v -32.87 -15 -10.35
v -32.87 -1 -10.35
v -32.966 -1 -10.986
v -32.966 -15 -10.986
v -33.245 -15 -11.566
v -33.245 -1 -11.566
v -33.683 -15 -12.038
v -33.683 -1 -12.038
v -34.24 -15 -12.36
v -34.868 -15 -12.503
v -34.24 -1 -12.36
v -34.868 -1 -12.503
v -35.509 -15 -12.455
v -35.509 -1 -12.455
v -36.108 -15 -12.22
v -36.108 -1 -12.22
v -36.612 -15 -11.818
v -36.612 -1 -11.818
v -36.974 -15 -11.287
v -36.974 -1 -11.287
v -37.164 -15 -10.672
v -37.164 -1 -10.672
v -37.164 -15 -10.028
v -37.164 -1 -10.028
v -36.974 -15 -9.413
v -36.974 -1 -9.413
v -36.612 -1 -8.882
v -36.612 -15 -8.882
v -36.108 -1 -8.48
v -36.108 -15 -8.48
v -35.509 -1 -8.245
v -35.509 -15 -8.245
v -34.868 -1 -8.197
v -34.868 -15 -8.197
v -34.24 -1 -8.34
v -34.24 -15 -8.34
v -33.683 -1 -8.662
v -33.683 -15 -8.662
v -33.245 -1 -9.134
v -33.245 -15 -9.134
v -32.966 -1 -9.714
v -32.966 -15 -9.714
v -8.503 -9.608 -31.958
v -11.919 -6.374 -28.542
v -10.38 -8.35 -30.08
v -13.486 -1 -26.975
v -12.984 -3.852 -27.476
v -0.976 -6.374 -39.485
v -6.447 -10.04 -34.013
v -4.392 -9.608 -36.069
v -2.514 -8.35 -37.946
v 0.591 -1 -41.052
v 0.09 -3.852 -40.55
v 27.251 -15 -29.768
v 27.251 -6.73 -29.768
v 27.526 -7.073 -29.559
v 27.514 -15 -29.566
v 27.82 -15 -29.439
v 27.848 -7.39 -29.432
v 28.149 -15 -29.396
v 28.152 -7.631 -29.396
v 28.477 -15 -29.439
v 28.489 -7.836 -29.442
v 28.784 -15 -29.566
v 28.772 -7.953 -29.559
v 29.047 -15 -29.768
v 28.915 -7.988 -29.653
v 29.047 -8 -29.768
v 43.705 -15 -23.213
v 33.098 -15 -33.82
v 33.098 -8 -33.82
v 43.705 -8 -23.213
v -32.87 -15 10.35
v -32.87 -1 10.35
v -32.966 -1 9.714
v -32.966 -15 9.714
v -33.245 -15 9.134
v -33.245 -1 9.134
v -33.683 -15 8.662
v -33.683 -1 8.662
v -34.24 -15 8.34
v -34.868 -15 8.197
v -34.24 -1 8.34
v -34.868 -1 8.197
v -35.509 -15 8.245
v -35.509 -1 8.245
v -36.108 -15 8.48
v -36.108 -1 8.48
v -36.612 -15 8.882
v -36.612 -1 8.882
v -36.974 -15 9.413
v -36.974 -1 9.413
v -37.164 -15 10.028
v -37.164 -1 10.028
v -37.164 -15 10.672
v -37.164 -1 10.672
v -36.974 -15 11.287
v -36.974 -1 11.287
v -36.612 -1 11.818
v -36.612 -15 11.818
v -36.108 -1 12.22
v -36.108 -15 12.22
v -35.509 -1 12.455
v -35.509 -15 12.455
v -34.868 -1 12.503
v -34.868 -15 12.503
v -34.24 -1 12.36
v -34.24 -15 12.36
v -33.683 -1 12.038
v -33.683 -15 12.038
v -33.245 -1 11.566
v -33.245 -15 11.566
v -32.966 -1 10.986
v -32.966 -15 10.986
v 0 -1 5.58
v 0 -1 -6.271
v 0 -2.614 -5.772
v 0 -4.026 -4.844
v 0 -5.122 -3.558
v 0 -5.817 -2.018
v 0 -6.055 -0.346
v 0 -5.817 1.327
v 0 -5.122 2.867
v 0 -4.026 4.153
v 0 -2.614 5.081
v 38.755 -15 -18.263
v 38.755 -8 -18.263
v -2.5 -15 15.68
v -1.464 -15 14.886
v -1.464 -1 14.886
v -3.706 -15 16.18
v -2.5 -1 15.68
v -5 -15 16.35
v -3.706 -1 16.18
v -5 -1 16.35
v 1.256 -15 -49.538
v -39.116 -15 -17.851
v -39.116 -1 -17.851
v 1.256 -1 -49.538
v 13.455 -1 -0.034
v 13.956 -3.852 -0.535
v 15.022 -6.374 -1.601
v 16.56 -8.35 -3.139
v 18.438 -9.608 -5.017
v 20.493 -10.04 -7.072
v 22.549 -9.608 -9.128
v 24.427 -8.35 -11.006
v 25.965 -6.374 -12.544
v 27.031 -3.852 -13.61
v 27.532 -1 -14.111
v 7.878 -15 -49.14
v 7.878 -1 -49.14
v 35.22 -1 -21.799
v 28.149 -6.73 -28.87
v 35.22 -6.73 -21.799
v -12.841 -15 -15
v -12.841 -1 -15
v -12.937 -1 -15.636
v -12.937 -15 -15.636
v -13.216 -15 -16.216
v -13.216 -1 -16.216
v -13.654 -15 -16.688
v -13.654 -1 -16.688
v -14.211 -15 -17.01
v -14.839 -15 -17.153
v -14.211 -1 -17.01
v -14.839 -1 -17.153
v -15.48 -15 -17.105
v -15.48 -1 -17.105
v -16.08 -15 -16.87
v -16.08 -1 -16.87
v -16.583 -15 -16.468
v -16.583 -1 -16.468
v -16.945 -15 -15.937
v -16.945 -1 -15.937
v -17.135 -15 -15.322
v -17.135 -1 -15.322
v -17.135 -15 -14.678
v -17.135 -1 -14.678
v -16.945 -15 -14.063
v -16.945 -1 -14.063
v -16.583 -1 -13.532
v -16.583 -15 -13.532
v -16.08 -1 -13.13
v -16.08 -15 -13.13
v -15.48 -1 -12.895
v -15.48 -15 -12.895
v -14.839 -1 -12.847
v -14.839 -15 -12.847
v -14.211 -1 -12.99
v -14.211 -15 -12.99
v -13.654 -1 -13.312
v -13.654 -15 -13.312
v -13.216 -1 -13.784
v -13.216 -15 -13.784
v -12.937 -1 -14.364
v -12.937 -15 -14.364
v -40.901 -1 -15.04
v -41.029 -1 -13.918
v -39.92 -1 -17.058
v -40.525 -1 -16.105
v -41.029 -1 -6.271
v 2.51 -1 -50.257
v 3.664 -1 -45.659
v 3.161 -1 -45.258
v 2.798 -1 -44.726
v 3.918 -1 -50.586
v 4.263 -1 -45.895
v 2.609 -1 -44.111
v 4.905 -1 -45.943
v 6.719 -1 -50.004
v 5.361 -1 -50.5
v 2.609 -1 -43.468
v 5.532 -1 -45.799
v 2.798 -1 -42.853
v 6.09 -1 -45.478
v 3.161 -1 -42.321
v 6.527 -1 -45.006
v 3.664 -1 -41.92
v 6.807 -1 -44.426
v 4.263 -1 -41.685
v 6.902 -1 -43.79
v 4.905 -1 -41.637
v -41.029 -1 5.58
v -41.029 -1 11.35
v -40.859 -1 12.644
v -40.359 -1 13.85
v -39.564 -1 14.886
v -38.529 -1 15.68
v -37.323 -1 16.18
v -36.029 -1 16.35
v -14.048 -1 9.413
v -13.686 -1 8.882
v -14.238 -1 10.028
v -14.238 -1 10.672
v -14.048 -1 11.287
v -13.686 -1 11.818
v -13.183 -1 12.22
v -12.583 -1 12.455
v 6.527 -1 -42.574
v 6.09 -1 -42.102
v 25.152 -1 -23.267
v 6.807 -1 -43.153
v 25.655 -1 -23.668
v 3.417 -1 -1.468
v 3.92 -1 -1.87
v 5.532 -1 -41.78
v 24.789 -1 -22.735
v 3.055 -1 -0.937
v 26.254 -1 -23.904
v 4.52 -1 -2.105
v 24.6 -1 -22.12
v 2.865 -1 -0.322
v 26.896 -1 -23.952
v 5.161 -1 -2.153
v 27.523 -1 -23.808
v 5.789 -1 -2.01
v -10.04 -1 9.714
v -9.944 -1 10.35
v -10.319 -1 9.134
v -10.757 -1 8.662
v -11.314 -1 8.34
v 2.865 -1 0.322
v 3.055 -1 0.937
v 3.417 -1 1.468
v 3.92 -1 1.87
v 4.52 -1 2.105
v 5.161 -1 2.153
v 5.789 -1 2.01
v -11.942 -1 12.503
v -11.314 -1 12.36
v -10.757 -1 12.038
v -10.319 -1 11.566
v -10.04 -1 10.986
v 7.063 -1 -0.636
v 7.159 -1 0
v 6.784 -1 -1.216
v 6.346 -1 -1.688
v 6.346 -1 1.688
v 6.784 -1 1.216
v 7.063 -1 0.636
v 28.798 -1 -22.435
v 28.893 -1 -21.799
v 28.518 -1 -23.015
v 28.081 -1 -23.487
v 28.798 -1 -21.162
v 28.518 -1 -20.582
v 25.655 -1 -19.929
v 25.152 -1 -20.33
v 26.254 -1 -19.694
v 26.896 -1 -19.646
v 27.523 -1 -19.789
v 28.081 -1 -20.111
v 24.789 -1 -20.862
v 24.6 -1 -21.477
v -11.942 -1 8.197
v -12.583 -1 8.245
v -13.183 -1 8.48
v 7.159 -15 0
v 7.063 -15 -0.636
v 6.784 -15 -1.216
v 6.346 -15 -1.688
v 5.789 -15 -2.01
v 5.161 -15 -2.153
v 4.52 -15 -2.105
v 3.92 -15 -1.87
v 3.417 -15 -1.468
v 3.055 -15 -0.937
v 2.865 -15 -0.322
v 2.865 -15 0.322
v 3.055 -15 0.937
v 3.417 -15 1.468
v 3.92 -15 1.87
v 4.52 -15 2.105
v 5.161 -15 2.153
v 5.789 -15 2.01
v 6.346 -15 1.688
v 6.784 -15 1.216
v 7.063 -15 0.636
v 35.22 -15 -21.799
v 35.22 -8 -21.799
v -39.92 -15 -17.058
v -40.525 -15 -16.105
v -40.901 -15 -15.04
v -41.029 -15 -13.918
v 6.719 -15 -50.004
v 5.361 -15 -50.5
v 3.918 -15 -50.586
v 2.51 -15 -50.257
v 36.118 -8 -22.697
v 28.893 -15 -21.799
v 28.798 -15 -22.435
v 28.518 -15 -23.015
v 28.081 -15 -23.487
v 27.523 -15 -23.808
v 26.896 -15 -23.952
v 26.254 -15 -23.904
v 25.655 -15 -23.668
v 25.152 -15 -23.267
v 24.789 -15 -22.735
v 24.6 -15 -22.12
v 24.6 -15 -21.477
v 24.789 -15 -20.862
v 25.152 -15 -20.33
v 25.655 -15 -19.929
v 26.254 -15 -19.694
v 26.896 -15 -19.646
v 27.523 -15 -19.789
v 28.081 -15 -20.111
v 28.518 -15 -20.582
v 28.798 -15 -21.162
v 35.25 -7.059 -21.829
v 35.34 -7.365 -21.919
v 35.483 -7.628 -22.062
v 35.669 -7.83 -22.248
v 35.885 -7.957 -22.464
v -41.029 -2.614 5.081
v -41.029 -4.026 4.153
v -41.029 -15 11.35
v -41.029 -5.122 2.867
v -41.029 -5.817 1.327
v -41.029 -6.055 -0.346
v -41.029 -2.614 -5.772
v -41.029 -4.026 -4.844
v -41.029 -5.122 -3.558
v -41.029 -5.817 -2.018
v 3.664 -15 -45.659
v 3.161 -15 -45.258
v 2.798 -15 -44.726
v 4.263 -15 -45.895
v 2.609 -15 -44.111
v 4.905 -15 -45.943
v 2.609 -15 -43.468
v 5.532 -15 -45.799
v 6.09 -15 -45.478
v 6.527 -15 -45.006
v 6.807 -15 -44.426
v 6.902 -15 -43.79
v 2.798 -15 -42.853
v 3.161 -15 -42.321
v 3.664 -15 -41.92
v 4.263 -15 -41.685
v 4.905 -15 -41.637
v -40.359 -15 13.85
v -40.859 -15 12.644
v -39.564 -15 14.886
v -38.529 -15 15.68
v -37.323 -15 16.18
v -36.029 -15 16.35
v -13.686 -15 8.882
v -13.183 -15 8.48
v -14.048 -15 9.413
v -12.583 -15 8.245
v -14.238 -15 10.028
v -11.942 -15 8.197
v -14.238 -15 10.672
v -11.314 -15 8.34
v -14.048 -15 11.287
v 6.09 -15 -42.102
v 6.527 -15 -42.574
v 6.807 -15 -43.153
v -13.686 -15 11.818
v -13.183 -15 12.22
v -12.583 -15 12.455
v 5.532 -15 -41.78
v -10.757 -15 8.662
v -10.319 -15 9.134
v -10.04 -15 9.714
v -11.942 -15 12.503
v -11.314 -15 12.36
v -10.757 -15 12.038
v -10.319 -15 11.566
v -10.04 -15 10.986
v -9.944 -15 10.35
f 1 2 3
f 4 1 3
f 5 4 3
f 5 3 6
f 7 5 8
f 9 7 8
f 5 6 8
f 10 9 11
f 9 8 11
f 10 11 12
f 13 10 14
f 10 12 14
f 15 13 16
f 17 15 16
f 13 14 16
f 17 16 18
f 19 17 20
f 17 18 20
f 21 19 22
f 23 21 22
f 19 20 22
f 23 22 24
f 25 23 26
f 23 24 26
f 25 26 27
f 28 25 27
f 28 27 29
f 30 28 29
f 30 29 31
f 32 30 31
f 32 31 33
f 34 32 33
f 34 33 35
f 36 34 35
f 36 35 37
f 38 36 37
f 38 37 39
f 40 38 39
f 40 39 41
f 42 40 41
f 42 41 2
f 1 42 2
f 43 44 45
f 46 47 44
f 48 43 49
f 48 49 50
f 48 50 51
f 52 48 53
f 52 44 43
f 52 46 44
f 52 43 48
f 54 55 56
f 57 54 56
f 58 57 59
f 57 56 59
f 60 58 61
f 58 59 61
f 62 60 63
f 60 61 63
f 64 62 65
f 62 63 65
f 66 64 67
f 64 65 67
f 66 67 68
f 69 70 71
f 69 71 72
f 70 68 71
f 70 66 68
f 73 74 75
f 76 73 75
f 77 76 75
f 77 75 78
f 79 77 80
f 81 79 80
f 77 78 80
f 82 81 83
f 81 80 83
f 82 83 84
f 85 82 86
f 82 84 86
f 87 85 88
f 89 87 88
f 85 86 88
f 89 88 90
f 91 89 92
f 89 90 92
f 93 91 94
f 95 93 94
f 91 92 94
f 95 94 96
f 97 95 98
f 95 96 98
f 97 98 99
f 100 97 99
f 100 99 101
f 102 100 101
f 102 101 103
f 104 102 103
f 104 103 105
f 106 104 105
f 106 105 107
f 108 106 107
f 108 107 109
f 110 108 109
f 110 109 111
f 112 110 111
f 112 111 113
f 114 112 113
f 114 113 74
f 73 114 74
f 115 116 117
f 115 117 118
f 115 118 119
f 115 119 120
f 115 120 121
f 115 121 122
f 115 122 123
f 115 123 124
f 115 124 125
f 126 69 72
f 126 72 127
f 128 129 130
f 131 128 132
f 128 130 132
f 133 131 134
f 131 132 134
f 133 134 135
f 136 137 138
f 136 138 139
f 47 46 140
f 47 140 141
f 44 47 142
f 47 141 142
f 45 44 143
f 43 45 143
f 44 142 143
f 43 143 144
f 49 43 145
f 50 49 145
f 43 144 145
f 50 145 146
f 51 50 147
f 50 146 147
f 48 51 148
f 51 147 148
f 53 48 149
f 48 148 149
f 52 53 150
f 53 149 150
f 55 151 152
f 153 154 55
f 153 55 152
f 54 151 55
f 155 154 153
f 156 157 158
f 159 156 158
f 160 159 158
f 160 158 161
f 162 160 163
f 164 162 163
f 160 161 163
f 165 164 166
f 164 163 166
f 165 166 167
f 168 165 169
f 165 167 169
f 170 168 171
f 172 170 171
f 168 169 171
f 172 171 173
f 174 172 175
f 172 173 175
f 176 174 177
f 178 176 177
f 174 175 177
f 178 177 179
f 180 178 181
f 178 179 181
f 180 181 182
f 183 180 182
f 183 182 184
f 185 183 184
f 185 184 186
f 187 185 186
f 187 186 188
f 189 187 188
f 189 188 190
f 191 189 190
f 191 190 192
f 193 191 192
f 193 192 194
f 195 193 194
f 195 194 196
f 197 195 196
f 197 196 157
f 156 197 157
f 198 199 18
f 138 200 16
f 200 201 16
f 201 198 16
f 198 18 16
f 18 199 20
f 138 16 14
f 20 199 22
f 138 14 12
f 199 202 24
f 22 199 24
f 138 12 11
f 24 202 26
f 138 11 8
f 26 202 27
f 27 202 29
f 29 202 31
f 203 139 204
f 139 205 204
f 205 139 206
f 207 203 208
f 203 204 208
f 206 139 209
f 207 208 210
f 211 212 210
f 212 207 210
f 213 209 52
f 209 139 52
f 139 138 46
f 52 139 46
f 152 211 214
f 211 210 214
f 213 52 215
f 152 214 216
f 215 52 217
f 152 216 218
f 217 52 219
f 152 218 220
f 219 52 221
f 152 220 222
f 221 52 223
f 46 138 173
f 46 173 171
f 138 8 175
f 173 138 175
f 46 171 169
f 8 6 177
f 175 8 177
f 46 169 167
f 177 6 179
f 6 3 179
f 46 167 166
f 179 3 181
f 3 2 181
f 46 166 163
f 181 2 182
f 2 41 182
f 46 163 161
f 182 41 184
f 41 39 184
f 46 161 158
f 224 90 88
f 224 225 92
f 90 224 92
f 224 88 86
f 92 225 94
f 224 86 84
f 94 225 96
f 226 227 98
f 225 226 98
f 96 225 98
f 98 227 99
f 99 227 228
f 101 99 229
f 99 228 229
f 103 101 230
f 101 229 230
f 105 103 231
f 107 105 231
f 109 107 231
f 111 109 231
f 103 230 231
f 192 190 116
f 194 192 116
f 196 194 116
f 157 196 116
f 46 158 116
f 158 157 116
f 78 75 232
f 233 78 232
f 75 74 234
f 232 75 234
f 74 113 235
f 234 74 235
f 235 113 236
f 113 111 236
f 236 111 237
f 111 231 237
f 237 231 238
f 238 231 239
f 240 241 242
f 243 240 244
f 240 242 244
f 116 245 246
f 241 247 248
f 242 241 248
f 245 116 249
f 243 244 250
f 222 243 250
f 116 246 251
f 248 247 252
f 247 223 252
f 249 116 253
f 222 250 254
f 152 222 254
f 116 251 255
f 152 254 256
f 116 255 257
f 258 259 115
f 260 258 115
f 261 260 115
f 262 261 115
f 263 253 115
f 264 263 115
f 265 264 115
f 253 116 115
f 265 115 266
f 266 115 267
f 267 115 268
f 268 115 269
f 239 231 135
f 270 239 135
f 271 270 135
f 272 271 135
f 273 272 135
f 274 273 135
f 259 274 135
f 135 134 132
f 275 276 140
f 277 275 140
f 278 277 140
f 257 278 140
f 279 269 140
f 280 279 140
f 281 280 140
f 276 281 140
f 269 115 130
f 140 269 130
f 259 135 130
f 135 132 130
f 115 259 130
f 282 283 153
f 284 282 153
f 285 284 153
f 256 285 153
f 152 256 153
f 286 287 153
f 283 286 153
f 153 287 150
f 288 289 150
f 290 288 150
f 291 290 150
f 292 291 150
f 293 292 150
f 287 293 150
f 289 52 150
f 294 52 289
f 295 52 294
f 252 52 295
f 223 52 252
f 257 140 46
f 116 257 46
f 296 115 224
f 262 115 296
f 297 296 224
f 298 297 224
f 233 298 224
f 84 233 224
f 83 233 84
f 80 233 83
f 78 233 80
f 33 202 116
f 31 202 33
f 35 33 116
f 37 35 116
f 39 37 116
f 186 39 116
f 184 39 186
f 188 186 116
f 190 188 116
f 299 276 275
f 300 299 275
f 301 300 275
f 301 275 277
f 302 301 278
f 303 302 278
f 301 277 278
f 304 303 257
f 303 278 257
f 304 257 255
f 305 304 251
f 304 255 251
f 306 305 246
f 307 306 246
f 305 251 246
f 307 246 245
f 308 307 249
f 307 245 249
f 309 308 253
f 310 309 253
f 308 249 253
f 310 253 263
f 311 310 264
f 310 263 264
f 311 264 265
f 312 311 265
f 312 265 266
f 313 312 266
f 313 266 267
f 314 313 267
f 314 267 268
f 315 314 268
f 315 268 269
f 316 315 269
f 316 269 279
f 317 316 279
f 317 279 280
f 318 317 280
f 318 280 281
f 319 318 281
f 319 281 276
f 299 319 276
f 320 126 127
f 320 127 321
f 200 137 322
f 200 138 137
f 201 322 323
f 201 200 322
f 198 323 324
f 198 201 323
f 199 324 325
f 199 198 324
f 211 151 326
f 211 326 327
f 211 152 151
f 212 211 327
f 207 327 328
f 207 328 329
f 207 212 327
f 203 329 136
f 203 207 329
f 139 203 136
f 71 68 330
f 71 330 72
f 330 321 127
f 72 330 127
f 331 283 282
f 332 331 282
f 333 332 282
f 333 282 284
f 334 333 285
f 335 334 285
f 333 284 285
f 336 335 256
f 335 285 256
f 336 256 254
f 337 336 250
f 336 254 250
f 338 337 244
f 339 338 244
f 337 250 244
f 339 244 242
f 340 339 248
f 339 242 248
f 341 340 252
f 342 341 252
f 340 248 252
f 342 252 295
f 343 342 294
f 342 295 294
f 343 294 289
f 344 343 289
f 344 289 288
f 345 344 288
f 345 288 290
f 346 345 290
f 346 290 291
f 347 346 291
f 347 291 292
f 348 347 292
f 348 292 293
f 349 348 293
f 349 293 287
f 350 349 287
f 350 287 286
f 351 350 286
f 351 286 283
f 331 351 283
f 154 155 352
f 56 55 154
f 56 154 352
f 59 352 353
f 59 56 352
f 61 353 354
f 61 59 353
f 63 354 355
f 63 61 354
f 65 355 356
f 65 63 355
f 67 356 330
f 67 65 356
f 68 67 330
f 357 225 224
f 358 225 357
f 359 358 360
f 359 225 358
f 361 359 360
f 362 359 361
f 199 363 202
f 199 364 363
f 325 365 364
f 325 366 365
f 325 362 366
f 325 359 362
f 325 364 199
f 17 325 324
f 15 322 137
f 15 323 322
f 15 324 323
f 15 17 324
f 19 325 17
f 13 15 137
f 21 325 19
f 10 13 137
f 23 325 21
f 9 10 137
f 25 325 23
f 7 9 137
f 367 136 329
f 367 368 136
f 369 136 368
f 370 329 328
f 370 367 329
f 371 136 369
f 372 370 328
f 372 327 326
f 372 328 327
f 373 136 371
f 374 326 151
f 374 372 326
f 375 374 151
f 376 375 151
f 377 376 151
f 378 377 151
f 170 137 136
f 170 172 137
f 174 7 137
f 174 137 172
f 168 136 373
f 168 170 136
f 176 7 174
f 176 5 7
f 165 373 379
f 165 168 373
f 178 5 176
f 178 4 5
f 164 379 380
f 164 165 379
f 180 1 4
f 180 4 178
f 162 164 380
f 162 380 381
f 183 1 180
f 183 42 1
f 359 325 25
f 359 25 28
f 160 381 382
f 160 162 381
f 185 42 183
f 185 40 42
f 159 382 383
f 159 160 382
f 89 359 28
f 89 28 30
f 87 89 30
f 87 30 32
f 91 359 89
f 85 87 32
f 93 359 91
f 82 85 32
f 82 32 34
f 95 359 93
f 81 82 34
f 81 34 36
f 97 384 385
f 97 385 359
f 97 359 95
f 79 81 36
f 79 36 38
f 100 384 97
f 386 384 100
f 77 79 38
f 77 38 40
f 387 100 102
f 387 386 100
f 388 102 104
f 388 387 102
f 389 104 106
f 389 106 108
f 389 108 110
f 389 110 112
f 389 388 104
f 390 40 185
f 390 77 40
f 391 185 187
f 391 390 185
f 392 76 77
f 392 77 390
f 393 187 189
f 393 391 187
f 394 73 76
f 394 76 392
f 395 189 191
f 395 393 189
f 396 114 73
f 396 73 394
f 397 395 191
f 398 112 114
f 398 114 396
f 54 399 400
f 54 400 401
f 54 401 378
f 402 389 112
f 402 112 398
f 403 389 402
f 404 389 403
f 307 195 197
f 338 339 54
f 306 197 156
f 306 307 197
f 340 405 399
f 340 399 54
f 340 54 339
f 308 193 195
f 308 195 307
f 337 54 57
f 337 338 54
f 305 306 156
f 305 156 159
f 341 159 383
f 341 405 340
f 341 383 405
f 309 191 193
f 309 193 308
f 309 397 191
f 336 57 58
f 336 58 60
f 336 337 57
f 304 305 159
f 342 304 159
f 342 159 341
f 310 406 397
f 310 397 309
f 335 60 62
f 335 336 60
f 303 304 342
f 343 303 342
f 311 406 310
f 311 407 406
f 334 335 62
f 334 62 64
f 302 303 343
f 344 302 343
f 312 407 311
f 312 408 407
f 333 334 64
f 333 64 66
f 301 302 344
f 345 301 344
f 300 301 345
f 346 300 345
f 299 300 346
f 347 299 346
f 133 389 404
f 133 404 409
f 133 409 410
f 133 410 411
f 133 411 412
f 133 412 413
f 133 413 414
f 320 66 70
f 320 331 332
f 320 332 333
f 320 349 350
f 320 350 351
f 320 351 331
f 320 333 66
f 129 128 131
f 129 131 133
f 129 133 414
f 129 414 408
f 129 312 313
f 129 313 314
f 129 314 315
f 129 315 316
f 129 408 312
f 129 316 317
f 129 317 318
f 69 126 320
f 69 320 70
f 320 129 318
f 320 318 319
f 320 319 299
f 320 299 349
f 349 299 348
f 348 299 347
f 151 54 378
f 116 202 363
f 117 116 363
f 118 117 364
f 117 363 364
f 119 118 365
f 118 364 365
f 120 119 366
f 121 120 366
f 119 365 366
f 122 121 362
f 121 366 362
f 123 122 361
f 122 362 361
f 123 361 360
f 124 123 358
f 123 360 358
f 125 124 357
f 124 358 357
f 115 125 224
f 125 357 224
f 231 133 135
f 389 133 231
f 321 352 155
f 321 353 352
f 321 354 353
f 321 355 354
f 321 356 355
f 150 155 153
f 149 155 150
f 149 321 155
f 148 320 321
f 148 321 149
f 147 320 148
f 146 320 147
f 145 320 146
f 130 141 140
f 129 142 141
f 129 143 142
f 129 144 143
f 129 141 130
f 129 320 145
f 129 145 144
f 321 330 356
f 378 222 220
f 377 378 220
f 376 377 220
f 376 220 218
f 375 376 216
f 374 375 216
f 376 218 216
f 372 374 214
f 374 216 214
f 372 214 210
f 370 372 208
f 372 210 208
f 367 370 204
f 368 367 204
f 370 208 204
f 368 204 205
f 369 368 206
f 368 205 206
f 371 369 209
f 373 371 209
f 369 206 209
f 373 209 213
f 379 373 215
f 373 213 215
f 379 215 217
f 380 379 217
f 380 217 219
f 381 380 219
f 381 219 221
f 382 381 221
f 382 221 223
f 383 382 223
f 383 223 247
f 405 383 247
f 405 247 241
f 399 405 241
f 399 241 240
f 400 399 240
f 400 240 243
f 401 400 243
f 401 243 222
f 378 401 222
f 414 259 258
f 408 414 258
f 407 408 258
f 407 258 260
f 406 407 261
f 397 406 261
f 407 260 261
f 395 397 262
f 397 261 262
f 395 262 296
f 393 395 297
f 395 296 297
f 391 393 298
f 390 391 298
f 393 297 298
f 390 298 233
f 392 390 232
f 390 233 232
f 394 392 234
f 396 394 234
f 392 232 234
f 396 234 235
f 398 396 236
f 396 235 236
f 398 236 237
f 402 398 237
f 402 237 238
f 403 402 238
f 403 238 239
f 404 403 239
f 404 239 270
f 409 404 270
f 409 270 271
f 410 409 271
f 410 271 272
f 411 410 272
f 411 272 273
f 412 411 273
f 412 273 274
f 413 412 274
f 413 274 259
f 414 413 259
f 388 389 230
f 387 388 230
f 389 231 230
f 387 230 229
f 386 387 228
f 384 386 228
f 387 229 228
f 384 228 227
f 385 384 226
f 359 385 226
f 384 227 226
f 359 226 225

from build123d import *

# Parameters (mm, degrees)
EXTRUDE_1_DEPTH        = 14
EXTRUDE_2_DEPTH        = 7
CUT_EXTRUDE_1_DEPTH    = 41.028932
CUT_EXTRUDE_2_DEPTH    = 38.1
HOLE_WIZARD_M4_1_D     = 4.318
HOLE_WIZARD_M4_1_DEPTH = 14
FILLET_1_R             = 5
FILLET_3_R             = 1.27
FILLET_4_R             = 1.27


with BuildPart() as part:
    # 草图1 → 凸台-拉伸1 (new body)
    with BuildSketch(Plane.XZ.offset(15)):
        Polygon((4.743453, -52.27499), (35.219756, -21.798688), (-2.928932, 16.35), (-41.028932, 16.35), (-41.028932, -16.35), align=None)
    extrude(amount=-EXTRUDE_1_DEPTH)

    # 草图2 → 凸台-拉伸2 (add)
    with BuildSketch(Plane.XZ.offset(15)):
        Polygon((43.705037, -23.212901), (38.75529, -18.263154), (35.219756, -21.798688), (28.148688, -28.869756), (33.098435, -33.819503), align=None)
    extrude(amount=-EXTRUDE_2_DEPTH)

    # 草图3 → 切除-拉伸1 (cut)
    with BuildSketch(Plane.ZY.offset(41.028932)):
        with BuildLine():
            Line((5.5795, -1), (-6.270766, -1))
            ThreePointArc((-6.270766, -1), (-0.345633, -6.055118), (5.5795, -1))
        make_face()
    extrude(amount=-CUT_EXTRUDE_1_DEPTH, mode=Mode.SUBTRACT)

    # 草图4 → 切除-拉伸2 (cut)
    with BuildSketch(Plane(origin=(6.710534, 0, 6.710534), x_dir=(0.707107, 0, -0.707107), z_dir=(0.707107, 0, 0.707107))):
        with BuildLine():
            Line((29.445831, -1), (9.538252, -1))
            ThreePointArc((9.538252, -1), (19.492041, -10.039754), (29.445831, -1))
        make_face()
    extrude(amount=-CUT_EXTRUDE_2_DEPTH, mode=Mode.SUBTRACT)

    # M4 间隙孔1
    with Locations(Plane(origin=(0, -15, 0), x_dir=(-1, 0, 0), z_dir=(0, -1, 0))):
        with Locations((35.028932, -10.35), (-5, 0), (15, 15), (12.103043, -10.35), (35.028932, 10.35), (-4.743453, 43.789709), (-26.734474, 21.798688)):
            Hole(HOLE_WIZARD_M4_1_D / 2, depth=HOLE_WIZARD_M4_1_DEPTH)

    # 圆角1
    fillet_1_edges = [part.edges().sort_by_distance(p)[0] for p in [
        (-41.028932, -8, -16.35),
        (-41.028932, -8, 16.35),
        (-2.928932, -8, 16.35),
        (4.743453, -8, -52.27499),
    ]]
    fillet(fillet_1_edges, radius=FILLET_1_R)

    # 圆角3
    fillet_3_edges = [part.edges().sort_by_distance(p)[0] for p in [
        (31.684222, -8, -25.334222),
    ]]
    fillet(fillet_3_edges, radius=FILLET_3_R)

    # 圆角4
    fillet_4_edges = [part.edges().sort_by_distance(p)[0] for p in [
        (28.148688, -11.5, -28.869756),
    ]]
    fillet(fillet_4_edges, radius=FILLET_4_R)


solid = part.part
